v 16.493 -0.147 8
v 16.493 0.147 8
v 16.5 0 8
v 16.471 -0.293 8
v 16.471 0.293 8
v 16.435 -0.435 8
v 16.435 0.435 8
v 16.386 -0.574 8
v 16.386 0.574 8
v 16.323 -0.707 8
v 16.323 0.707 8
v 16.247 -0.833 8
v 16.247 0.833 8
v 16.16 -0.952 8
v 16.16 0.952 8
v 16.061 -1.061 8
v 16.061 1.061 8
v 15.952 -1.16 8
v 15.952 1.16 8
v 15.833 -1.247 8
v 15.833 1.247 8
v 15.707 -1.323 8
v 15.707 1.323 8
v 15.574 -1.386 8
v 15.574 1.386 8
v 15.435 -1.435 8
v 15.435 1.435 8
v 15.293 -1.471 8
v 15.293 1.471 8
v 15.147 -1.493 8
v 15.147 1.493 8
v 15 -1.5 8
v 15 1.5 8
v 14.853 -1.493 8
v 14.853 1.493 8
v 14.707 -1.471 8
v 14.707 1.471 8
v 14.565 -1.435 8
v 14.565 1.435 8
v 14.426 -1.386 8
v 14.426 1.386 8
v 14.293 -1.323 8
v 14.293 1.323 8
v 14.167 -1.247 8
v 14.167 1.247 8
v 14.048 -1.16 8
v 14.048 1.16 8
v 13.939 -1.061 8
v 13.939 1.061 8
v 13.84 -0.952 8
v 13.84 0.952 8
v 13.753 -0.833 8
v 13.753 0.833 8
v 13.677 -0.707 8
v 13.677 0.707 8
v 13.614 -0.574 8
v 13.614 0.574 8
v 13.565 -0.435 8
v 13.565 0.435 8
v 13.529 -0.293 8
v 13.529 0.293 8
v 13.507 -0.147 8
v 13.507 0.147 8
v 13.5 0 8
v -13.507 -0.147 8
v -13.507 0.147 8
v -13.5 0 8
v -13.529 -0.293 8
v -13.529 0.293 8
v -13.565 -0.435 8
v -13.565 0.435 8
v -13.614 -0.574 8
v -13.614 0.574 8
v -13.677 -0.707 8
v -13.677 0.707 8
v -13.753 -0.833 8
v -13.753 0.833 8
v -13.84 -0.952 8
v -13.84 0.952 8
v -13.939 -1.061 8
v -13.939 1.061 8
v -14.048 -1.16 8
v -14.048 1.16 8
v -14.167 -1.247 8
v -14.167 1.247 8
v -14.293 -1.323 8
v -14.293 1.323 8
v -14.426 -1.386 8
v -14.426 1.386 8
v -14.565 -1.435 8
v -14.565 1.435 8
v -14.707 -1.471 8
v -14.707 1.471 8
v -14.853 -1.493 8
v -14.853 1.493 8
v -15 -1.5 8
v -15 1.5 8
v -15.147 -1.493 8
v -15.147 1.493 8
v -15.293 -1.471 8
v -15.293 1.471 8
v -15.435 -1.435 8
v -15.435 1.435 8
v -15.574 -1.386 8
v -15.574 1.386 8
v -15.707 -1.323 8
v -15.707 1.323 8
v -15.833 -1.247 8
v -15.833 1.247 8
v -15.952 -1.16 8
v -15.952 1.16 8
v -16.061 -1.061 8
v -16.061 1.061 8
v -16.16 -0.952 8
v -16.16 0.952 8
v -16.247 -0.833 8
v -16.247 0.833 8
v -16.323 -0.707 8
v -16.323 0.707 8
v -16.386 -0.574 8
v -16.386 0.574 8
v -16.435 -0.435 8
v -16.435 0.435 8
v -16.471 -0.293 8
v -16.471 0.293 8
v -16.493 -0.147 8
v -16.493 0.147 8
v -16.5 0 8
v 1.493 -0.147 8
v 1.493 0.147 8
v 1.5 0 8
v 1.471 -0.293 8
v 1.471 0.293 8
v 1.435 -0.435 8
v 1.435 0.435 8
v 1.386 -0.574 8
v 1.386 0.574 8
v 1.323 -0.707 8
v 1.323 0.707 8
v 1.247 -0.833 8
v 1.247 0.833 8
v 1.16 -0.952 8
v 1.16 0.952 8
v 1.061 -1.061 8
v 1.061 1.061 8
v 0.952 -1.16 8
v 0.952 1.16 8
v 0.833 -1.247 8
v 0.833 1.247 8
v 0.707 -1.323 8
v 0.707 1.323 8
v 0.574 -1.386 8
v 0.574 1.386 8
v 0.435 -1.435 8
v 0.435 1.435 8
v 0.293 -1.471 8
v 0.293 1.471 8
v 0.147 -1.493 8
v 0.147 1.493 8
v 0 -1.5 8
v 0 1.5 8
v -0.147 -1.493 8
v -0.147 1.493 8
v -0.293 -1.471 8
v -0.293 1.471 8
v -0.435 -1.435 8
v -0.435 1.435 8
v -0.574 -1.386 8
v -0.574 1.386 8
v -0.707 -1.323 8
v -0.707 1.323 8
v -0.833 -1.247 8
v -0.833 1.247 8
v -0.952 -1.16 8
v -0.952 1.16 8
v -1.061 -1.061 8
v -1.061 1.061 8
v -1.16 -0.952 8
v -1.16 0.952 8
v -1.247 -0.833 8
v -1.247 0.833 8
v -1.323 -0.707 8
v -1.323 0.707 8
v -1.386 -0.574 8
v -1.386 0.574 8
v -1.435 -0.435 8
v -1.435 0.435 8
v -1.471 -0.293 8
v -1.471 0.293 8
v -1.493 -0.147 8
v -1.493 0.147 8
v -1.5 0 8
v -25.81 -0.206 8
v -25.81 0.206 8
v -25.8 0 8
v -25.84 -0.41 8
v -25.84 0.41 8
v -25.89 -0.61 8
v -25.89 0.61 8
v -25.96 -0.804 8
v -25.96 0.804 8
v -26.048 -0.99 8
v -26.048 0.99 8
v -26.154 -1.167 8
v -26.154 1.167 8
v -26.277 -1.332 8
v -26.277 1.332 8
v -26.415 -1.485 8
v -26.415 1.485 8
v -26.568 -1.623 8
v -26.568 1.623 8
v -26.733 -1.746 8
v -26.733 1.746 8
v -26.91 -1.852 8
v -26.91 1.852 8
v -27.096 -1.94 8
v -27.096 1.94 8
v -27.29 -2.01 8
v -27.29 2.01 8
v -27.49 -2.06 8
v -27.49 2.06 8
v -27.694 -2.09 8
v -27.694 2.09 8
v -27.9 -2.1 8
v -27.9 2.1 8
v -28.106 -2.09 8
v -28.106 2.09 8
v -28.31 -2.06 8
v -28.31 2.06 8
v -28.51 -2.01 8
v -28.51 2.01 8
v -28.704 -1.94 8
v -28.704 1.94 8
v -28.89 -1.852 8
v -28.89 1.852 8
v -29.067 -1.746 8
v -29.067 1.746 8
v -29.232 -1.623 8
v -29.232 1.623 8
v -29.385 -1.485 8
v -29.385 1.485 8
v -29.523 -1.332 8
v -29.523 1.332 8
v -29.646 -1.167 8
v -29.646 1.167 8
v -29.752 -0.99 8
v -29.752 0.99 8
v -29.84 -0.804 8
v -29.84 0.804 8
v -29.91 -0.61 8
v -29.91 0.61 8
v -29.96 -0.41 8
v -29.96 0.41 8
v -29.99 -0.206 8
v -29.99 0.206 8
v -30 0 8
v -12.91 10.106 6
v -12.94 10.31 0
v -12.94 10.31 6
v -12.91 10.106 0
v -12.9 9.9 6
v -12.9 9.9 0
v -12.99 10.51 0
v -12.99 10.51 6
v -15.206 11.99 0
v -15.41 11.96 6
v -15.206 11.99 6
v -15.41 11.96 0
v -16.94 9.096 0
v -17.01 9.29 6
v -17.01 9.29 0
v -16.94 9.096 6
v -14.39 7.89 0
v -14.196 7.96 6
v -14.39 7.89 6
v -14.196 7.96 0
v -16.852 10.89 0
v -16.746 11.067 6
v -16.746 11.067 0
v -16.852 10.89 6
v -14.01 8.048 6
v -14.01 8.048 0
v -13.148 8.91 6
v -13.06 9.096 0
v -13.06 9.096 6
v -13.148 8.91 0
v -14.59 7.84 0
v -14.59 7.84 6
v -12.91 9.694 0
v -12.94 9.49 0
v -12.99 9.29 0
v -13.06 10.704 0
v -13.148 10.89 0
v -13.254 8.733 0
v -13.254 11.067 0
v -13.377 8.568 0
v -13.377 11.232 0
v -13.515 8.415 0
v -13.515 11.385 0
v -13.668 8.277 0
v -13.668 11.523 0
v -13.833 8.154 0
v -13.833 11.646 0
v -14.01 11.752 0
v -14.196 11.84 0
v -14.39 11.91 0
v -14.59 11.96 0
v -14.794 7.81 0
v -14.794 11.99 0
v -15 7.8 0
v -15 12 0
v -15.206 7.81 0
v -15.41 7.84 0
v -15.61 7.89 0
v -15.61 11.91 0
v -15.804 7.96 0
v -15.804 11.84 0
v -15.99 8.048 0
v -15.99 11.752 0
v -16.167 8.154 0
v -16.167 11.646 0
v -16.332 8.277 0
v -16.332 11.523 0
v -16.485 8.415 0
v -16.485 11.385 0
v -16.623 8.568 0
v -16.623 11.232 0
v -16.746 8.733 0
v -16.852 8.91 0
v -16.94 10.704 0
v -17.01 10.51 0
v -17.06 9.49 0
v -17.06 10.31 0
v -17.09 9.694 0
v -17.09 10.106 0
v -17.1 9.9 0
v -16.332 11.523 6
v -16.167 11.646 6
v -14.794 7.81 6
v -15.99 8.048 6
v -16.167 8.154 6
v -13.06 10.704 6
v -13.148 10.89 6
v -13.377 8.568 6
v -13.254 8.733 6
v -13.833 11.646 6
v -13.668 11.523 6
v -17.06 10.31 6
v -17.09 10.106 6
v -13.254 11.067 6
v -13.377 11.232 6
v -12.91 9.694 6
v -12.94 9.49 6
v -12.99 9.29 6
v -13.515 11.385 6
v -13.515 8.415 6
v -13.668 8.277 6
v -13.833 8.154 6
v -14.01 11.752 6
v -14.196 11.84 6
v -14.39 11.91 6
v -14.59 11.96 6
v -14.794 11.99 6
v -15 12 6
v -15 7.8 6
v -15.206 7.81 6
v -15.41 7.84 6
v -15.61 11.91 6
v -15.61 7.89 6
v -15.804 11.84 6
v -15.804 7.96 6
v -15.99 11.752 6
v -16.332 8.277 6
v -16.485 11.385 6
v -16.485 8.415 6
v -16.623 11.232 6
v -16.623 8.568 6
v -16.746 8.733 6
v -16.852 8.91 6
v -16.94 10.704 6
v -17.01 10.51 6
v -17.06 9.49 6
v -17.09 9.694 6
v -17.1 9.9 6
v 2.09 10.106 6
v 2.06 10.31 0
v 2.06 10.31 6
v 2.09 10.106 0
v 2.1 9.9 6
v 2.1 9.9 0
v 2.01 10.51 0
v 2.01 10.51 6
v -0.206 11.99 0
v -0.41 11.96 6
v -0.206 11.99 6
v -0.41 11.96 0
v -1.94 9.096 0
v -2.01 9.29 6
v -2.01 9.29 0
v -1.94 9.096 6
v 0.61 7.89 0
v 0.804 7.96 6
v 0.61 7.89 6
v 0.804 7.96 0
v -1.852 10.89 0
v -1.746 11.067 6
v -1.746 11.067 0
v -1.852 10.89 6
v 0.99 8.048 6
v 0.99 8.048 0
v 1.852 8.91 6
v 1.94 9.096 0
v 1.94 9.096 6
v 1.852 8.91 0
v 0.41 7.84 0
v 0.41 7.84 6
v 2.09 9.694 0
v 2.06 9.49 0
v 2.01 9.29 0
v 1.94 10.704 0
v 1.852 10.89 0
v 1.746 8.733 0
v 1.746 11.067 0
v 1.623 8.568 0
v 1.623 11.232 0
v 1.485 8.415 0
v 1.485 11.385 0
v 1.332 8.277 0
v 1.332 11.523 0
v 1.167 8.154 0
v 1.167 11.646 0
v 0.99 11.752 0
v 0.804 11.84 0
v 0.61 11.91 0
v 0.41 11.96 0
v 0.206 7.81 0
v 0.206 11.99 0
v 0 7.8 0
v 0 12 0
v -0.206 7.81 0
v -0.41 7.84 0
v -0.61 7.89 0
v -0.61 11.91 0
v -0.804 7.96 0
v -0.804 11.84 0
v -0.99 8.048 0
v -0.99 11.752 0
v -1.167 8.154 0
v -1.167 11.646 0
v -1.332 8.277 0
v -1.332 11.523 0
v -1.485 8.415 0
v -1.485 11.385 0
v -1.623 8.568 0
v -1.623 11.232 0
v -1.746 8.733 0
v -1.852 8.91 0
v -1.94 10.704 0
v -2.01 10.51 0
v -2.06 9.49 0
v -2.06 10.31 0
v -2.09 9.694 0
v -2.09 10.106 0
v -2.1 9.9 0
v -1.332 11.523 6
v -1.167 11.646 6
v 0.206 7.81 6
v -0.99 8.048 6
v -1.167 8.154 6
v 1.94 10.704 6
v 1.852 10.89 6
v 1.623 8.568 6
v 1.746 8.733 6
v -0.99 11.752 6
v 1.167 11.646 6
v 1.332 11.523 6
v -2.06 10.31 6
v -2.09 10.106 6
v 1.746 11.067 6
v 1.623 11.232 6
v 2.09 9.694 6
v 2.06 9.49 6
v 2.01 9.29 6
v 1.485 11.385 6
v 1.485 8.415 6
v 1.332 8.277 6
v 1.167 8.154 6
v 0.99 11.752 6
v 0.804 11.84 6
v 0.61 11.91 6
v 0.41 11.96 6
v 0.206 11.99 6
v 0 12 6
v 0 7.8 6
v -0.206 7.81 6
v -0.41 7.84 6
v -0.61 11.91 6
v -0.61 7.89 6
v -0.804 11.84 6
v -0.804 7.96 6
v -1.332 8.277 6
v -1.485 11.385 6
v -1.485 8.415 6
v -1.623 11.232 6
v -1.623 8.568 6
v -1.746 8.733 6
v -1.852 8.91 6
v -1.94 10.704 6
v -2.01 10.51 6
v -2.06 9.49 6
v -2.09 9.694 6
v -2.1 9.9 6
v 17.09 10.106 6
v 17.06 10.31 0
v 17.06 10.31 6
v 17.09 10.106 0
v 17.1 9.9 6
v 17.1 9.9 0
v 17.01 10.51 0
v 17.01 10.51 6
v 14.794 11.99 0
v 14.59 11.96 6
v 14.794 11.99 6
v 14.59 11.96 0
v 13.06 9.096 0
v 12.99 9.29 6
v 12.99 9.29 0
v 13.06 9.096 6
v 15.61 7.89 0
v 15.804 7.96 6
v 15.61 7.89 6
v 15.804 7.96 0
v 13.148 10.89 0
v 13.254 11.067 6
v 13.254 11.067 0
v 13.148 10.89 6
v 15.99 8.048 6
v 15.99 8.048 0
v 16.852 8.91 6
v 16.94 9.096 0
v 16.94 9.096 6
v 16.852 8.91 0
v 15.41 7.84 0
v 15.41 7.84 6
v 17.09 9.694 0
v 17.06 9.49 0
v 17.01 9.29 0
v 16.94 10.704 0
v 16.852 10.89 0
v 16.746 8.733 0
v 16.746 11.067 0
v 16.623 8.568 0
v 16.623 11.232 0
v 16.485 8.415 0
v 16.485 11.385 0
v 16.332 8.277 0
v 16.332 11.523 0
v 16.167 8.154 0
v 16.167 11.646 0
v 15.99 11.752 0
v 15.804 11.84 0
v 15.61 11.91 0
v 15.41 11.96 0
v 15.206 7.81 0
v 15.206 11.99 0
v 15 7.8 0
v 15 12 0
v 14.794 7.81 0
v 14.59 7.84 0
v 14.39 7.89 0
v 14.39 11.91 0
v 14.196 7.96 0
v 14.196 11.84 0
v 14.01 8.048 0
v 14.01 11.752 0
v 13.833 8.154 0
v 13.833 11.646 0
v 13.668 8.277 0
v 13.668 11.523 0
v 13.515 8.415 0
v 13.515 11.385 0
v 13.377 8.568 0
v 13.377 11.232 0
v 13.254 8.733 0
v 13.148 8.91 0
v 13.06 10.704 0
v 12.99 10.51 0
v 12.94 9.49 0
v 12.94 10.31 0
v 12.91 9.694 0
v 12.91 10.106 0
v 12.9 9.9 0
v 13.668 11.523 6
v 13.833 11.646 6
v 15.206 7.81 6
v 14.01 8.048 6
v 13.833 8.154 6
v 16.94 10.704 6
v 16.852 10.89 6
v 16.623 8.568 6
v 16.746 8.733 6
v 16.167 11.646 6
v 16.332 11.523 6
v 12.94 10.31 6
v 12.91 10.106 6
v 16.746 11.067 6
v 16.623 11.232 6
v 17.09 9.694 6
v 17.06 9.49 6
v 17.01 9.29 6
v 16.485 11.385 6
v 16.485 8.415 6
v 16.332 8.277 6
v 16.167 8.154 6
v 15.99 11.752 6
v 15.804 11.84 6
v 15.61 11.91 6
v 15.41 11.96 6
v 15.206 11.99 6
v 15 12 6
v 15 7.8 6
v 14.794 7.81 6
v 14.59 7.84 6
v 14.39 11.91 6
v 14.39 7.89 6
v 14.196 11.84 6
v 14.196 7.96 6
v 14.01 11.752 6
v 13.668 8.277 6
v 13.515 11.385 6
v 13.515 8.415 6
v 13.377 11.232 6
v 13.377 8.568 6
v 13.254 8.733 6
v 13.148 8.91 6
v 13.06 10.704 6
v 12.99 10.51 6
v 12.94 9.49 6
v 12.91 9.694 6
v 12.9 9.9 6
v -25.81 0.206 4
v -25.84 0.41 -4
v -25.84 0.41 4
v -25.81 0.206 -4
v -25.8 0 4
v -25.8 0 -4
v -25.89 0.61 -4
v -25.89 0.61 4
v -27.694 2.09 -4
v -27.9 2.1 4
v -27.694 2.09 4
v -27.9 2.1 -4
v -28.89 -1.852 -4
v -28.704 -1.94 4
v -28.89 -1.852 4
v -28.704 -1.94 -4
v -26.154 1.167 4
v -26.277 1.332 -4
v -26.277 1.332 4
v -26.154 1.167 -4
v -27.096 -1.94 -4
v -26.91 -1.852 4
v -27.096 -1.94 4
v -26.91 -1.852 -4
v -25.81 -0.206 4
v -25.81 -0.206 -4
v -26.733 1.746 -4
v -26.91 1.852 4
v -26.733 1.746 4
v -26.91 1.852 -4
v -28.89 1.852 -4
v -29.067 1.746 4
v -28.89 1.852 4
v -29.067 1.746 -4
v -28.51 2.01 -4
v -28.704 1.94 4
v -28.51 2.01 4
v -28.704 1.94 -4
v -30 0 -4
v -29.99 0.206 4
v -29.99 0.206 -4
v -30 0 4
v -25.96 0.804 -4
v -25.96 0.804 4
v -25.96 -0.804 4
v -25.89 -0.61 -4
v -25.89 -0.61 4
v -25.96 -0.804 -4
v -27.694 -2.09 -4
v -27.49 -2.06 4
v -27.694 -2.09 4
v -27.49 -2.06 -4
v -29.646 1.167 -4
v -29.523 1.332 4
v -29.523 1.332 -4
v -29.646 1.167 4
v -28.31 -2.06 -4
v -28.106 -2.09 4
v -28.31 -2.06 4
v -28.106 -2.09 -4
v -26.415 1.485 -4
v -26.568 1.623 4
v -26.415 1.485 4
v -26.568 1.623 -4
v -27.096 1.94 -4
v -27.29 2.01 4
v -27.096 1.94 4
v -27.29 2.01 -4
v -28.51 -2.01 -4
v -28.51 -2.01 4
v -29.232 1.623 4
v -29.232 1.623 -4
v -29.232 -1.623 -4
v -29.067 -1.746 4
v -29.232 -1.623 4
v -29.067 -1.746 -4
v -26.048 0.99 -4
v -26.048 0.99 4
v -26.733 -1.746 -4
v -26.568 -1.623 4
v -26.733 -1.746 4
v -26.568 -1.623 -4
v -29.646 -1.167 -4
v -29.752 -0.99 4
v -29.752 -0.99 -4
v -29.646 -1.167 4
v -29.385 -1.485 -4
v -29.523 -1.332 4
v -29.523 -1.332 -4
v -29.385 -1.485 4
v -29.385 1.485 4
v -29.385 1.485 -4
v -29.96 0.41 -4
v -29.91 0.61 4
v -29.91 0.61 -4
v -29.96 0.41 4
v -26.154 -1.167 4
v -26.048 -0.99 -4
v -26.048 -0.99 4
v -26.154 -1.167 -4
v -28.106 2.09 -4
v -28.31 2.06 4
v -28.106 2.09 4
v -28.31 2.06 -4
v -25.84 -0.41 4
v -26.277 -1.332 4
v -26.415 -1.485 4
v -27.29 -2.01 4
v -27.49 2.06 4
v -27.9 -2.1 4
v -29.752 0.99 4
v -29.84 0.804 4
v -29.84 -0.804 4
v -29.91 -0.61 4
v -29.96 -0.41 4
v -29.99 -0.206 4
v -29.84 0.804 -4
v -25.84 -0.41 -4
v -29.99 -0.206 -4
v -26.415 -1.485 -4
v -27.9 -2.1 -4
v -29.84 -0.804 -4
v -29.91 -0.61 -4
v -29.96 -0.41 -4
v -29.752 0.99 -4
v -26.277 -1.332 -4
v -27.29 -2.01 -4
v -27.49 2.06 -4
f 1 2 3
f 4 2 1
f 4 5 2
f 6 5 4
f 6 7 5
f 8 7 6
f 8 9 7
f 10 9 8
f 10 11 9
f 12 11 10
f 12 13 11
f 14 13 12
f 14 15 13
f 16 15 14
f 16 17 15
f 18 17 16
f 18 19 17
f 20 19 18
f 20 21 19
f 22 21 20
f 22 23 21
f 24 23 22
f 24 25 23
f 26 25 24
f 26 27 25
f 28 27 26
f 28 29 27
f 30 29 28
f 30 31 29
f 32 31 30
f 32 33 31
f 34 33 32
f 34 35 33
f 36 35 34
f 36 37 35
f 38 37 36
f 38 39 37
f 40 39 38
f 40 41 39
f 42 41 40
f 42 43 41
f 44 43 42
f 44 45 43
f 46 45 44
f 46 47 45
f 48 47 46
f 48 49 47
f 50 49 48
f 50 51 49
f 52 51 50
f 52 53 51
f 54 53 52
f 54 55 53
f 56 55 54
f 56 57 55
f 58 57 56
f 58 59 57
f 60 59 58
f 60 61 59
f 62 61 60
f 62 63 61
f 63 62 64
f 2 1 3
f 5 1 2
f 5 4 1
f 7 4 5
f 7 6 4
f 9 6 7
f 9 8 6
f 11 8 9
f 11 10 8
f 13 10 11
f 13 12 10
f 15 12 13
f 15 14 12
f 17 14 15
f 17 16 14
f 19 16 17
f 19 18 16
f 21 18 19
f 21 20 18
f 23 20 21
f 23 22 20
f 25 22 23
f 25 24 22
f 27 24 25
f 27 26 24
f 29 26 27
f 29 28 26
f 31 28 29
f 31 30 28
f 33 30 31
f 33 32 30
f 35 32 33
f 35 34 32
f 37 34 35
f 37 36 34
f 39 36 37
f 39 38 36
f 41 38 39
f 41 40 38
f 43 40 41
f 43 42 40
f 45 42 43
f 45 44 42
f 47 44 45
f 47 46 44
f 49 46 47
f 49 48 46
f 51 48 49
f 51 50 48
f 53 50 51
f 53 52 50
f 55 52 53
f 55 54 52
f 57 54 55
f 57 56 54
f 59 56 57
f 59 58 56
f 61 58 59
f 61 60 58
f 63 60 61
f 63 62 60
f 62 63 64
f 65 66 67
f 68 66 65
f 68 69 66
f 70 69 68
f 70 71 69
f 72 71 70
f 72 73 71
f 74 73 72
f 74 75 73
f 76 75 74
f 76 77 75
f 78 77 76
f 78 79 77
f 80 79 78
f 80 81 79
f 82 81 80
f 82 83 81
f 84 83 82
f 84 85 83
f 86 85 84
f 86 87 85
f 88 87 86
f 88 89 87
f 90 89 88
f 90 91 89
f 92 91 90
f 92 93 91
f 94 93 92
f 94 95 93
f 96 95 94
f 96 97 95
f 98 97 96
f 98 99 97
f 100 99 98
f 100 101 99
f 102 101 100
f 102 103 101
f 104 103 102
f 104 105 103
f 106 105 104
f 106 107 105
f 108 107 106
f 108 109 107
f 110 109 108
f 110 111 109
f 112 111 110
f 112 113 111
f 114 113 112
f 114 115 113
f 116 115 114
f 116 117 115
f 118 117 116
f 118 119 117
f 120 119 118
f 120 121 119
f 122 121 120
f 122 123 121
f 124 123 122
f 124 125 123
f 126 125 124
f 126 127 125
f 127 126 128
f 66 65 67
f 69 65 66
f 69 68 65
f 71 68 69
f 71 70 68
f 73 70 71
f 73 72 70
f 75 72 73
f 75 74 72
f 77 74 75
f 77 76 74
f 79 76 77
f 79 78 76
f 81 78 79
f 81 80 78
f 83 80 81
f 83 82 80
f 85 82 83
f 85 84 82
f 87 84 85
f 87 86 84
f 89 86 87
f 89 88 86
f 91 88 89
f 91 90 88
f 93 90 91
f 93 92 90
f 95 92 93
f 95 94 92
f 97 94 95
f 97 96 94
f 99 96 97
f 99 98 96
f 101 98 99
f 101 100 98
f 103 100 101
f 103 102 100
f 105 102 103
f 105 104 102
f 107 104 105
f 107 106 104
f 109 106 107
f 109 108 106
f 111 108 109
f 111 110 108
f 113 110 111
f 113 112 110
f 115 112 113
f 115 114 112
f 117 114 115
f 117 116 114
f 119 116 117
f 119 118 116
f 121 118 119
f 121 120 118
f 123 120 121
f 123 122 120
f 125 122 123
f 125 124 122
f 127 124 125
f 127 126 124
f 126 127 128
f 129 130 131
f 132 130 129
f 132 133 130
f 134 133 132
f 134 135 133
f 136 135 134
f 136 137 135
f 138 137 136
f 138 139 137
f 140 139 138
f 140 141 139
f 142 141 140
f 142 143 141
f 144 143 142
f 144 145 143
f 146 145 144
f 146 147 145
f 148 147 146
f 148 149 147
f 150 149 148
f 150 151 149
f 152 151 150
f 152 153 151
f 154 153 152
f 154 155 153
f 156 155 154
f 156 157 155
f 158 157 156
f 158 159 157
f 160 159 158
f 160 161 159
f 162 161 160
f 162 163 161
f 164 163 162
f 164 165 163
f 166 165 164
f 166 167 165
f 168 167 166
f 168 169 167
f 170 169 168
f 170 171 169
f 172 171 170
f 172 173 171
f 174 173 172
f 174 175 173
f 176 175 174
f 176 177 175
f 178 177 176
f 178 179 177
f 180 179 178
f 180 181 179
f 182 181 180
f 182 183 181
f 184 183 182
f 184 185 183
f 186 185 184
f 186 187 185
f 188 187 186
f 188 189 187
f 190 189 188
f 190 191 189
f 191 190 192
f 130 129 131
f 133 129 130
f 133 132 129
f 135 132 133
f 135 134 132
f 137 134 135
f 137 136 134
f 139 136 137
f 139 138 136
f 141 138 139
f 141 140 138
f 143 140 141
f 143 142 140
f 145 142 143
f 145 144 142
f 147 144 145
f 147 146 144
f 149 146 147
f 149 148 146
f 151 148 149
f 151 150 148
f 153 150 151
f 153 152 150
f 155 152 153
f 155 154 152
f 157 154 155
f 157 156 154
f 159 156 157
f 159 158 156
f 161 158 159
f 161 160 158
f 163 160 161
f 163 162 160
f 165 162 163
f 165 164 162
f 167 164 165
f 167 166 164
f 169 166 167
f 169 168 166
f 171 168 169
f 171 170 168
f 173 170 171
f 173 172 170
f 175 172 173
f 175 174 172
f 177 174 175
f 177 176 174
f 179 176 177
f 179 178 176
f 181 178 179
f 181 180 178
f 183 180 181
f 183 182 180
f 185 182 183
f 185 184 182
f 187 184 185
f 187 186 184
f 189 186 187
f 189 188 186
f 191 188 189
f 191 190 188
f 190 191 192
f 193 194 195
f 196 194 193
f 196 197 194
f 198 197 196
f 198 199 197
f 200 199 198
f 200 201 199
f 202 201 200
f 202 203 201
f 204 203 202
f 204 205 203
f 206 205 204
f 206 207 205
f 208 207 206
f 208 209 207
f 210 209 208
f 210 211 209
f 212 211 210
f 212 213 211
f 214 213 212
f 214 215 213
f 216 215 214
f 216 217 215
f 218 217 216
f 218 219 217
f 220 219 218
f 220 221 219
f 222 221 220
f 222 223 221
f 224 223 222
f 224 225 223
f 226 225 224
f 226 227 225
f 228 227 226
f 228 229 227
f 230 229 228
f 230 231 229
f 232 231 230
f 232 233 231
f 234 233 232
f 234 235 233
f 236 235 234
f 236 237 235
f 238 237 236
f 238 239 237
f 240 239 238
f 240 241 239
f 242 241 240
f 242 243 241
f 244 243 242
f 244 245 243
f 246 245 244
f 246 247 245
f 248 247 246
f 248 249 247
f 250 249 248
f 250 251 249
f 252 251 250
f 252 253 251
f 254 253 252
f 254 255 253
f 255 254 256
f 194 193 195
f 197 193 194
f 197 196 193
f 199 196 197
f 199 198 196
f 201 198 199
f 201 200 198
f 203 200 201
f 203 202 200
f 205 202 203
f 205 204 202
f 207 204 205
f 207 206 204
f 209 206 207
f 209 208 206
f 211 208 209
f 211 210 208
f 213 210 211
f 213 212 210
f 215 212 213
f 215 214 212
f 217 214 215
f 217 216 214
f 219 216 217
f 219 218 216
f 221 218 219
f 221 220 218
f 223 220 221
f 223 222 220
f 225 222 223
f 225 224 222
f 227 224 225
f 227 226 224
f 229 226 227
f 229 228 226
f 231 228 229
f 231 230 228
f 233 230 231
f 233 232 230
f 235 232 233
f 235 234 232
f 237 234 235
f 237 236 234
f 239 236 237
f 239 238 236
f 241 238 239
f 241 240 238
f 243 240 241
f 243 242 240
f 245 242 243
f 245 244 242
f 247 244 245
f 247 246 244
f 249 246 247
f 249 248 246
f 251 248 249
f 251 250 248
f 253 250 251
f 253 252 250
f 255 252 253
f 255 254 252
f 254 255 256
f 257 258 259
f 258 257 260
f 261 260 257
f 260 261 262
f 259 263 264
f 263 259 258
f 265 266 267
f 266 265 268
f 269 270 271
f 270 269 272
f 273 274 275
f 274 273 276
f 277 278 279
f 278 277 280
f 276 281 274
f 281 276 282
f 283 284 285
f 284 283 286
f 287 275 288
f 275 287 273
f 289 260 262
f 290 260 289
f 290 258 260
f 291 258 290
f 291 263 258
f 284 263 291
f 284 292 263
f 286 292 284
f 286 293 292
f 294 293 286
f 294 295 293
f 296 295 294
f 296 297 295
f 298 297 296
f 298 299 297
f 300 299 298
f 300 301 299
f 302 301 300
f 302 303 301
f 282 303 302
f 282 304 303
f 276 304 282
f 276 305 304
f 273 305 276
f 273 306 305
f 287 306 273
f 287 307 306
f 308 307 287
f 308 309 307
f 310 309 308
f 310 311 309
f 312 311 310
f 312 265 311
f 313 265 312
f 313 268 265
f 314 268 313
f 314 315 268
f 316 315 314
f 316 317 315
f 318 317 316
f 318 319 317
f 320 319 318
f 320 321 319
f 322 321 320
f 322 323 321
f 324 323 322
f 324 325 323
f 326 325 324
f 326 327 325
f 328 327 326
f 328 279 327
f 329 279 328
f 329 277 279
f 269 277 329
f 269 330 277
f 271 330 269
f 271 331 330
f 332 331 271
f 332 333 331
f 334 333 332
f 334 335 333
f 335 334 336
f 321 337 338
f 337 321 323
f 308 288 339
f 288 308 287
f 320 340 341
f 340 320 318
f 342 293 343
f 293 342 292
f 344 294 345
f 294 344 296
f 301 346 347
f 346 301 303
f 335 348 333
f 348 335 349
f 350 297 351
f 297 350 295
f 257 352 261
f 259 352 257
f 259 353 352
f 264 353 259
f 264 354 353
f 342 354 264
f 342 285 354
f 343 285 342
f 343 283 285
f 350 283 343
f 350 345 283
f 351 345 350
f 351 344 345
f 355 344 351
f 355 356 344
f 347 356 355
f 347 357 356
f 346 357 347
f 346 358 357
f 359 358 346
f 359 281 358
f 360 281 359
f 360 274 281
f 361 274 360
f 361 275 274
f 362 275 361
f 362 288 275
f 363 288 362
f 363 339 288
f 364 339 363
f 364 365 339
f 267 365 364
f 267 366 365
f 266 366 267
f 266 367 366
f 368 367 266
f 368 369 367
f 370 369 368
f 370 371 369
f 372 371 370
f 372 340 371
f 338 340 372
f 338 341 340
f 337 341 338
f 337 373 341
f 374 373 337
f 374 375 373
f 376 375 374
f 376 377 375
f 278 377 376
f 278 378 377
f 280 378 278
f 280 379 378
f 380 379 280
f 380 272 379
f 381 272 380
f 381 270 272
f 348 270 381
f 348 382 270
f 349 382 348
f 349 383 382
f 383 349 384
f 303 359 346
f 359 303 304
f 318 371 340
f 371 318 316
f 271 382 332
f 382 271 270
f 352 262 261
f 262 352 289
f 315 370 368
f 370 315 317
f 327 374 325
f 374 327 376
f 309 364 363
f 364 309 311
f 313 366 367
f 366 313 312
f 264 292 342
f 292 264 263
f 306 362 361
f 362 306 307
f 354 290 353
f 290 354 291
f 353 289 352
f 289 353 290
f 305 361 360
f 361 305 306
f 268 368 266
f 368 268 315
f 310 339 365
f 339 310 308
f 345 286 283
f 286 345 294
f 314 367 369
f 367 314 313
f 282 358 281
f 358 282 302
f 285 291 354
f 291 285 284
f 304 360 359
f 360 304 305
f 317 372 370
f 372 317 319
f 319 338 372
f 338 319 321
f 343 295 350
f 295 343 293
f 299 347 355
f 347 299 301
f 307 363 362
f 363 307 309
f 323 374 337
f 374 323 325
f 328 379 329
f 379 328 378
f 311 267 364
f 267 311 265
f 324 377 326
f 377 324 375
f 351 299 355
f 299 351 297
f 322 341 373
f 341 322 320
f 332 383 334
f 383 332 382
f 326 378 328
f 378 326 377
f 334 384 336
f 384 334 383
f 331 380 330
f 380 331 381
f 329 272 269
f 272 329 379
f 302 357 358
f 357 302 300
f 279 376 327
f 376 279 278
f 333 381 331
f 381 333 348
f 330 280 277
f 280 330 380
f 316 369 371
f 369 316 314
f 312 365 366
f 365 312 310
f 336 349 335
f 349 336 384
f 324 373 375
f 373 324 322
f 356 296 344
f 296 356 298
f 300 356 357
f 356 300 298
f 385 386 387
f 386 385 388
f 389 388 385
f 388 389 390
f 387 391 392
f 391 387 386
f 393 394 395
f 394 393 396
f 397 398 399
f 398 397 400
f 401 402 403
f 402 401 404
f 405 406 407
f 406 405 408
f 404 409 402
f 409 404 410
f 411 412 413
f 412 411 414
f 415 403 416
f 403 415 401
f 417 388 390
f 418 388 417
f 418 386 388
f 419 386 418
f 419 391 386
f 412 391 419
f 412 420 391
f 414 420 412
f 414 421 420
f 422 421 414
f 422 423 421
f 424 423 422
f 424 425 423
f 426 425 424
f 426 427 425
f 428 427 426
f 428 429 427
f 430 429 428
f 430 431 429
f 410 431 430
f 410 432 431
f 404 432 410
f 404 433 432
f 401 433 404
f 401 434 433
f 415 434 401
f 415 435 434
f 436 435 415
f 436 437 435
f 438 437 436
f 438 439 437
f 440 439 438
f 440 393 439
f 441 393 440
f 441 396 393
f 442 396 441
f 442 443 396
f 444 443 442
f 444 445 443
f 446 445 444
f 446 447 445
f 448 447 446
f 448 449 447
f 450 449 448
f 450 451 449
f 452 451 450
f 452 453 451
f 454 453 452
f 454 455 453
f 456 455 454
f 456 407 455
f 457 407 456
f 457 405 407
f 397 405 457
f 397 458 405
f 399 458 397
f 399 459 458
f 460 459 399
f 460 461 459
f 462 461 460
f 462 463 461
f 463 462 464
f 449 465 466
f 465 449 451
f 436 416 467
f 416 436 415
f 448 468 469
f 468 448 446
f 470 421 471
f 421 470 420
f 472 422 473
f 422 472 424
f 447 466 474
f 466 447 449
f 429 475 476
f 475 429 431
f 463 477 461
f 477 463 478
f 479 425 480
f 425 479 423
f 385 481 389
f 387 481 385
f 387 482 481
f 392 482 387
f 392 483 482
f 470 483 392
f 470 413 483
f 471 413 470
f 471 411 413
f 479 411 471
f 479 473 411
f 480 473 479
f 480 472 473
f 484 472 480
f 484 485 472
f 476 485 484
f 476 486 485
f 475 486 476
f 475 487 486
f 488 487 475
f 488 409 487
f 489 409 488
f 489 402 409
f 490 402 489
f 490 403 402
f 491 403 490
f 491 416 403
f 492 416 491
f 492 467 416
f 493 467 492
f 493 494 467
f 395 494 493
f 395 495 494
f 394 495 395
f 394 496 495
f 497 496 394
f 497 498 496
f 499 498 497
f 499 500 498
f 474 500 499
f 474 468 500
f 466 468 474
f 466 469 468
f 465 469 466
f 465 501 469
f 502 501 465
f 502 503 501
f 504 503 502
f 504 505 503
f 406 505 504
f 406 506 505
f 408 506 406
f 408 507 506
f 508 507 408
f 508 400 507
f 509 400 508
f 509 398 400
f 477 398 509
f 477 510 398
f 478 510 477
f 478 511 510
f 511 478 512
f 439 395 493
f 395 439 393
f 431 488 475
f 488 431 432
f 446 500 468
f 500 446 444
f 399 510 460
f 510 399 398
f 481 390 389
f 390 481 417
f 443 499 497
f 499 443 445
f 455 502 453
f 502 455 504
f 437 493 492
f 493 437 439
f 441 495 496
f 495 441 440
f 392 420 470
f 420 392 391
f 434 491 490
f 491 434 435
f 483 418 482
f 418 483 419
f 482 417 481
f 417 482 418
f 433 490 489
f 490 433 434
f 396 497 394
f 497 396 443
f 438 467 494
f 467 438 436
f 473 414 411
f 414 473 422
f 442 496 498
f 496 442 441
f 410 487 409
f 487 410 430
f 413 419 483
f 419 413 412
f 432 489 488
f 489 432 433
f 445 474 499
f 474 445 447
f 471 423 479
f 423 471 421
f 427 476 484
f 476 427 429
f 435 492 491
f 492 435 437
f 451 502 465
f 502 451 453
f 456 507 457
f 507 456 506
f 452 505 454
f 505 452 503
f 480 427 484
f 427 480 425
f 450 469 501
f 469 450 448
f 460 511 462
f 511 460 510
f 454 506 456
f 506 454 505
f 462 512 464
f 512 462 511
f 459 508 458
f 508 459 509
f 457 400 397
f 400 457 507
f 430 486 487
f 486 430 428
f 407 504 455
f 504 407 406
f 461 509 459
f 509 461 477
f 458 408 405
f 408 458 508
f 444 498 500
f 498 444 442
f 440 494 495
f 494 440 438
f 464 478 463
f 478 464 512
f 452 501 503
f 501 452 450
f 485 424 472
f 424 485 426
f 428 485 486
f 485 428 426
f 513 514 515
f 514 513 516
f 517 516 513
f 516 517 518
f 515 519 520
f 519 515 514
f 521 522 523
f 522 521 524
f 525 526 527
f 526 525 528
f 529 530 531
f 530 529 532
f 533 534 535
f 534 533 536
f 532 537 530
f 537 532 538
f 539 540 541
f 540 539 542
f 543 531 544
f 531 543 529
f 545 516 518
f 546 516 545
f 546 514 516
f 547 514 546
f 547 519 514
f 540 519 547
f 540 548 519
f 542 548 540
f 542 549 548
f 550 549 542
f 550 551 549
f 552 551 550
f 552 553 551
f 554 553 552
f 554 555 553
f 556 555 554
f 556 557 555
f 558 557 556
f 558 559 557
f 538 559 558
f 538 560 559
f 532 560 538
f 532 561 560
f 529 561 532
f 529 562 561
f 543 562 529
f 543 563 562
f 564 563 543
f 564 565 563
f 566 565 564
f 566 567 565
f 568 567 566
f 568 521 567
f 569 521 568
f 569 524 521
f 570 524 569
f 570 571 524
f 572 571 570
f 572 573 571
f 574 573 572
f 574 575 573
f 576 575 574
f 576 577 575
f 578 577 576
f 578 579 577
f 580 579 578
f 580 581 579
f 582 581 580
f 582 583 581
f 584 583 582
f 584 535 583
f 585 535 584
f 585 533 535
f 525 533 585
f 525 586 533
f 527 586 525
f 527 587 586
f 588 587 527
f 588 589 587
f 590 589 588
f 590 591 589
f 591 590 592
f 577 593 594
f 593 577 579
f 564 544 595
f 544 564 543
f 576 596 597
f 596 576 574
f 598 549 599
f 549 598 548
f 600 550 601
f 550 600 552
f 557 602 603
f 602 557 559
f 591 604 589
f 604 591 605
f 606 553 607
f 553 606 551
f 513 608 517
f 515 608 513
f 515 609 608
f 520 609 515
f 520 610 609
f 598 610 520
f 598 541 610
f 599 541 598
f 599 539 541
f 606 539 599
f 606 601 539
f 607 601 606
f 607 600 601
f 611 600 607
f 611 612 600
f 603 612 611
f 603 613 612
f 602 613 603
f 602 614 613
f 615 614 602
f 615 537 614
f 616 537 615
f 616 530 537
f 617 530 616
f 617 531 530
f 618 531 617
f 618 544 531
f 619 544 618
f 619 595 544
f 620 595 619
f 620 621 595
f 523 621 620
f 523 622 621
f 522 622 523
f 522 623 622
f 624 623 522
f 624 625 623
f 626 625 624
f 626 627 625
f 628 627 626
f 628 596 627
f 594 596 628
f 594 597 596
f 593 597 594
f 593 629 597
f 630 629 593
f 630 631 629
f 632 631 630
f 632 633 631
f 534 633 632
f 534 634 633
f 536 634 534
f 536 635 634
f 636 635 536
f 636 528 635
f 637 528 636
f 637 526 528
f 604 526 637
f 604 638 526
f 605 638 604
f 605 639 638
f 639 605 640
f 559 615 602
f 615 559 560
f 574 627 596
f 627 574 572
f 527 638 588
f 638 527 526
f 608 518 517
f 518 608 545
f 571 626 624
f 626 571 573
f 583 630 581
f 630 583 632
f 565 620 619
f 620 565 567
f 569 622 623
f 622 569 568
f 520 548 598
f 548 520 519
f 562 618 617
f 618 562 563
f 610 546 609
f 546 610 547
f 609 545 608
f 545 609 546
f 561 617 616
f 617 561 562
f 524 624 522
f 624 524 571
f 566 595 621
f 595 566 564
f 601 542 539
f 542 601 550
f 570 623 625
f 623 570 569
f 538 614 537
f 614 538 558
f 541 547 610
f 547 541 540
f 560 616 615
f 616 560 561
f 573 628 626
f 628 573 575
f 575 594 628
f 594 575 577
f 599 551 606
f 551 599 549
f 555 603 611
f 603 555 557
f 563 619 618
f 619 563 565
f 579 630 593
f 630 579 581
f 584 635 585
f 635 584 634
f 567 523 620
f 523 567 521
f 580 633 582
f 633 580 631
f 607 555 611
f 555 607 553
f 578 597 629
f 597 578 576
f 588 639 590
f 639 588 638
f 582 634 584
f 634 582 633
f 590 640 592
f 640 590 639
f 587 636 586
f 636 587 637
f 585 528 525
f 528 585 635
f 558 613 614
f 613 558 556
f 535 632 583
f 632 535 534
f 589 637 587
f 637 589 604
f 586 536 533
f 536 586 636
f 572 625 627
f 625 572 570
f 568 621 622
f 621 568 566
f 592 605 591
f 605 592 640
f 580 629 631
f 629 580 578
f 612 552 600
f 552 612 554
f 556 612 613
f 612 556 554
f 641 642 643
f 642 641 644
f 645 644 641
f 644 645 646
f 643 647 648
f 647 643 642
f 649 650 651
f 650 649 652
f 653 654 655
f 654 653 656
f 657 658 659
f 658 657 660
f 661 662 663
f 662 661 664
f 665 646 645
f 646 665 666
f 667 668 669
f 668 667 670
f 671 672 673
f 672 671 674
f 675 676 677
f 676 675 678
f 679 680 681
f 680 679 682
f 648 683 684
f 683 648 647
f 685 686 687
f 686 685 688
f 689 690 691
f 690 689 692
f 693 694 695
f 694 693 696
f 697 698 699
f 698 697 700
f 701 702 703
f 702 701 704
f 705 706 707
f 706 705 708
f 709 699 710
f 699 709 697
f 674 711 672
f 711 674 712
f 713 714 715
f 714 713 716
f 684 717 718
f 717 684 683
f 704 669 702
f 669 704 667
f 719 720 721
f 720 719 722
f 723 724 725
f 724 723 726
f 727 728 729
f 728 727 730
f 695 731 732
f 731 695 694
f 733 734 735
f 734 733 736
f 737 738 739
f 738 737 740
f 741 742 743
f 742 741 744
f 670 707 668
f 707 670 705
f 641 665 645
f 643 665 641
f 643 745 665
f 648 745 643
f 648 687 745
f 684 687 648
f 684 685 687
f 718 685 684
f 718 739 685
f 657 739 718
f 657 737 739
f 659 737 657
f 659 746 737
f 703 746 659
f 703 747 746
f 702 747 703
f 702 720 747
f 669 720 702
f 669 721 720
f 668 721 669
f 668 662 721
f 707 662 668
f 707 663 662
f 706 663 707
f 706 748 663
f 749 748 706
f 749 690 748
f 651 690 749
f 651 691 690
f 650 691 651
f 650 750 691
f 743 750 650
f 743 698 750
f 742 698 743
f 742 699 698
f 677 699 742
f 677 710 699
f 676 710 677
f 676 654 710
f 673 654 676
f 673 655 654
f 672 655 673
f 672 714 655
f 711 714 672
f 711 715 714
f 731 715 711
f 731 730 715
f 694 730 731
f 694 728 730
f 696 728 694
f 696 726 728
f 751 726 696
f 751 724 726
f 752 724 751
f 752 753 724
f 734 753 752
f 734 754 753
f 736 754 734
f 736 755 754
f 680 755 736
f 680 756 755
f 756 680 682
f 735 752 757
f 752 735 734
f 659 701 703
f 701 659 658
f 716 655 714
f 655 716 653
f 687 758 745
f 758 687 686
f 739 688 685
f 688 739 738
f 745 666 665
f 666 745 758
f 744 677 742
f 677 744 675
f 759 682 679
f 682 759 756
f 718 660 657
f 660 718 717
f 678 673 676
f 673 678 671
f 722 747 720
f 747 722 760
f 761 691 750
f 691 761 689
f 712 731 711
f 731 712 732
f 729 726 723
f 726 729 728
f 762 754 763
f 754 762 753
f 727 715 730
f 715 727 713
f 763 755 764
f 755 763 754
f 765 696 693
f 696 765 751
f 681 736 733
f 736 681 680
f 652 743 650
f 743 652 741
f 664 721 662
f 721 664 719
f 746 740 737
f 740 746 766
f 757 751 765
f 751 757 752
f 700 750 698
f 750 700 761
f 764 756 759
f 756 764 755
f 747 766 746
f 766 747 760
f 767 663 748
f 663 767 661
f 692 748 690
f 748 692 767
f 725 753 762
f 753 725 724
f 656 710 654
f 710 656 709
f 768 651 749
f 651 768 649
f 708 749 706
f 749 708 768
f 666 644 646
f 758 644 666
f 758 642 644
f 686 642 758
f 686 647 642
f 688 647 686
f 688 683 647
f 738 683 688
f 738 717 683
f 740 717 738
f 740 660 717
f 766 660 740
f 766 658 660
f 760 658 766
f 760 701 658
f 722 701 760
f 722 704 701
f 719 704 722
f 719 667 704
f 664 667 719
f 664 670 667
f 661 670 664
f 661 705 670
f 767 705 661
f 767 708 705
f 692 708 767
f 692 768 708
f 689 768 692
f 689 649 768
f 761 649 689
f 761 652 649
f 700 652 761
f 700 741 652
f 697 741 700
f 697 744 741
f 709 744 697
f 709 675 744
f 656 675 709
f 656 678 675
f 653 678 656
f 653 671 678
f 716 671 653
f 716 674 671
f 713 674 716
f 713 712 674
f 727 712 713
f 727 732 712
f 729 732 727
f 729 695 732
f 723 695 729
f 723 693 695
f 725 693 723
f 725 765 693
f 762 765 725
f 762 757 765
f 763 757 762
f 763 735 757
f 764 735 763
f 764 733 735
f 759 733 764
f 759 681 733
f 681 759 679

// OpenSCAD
// --- Dimensions (mm) ---

// Block dimensions
block_length = 60;   // X dimension
block_width = 24;    // Y dimension
block_height = 16;   // Z dimension

// Tubing/Channel dimensions
tube_diameter = 3.0;  // Diameter of internal channels
inlet_socket_dia = 4.2; // Inlet socket diameter
outlet_socket_dia = 4.2; // Outlet socket diameter
inlet_depth = 8.0;    // Depth of inlet socket
outlet_depth = 6.0;   // Depth of outlet sockets

// Screw hole dimensions
screw_hole_diameter = 3.4; // Diameter for M3 screws
screw_hole_offset_x1 = -25; // X position of first screw hole (relative to center)
screw_hole_offset_x2 = 25;  // X position of second screw hole (relative to center)
screw_hole_y_pos = -6.0;    // Y position of both screw holes

// Channel positions and lengths
main_channel_stop_x = 15; // Where the main channel stops internally
outlet_branch_x1 = -15;  // X position for first outlet branch
outlet_branch_x2 = 0;    // X position for second outlet branch
outlet_branch_x3 = 15;   // X position for third outlet branch

// --- Constants ---
$fn = 64; // High resolution for curves

// --- Base Block ---
module block() {
    cube([block_length, block_width, block_height], center = true);
}

// --- Features ---

// 1. Inlet Socket (on -X face, y=0)
module inlet_socket() {
    // Positioned at the -X end face (-block_length/2). Y=0 is correct. Z centered.
    translate([-block_length/2 + (inlet_socket_dia / 2), 0, 0]) {
        cylinder(h = inlet_depth, r = inlet_socket_dia / 2, center = true);
    }
}

// 2. Outlet Sockets (on +Y face)
module outlet_socket() {
    // Socket centered at the branch X position, on the Y face (+block_width/2). Z centered.
    translate([0, block_width/2 - (outlet_socket_dia / 2), 0]) {
        cylinder(h = outlet_depth, r = outlet_socket_dia / 2, center = true);
    }
}

// 3. Internal Channels (Hollowed out)
module internal_channels() {
    difference() {
        block(); // Start with the solid block shape for subtraction reference

        // A. Main Channel (Runs from inlet area towards X=15, closed inside)
        translate([-(block_length/2 - (inlet_socket_dia / 2)), 0, block_height/2]) {
            cylinder(h = main_channel_stop_x + (block_length/2 - (inlet_socket_dia / 2)) , r = tube_diameter / 2);
        }

        // B. Outlet Channels (Branching from X=-15, 0, 15 towards +Y face)
        for (i = [outlet_branch_x1, outlet_branch_x2, outlet_branch_x3]) {
            translate([i, 0, block_height/2]) {
                // Length needed: from center line (Y=0) to exit face (Y=block_width/2). Add tube radius for clean cut.
                cylinder(h = block_width / 2 + tube_diameter/2 , r = tube_diameter / 2);
            }
        }

        // C. Closing the Main Channel at X=15 (to ensure it's closed inside)
        translate([main_channel_stop_x + block_length/2, 0, block_height/2]) {
            cylinder(h = tube_diameter * 2, r = tube_diameter / 2);
        }

        // D. Inlet Connection Cutout (To allow tubing entry)
        translate([-block_length/2 + (inlet_socket_dia / 2), 0, block_height/2]) {
            cylinder(h = block_height * 2, r = inlet_socket_dia / 2);
        }

    }
}


// 4. Screw Holes (Vertical through-holes)
module screw_holes() {
    for (i = [screw_hole_offset_x1, screw_hole_offset_x2]) {
        translate([i, screw_hole_y_pos, -block_height/2 - 0.01]) { // Extend slightly past bottom face
            cylinder(h = block_height + 0.02, r = screw_hole_diameter / 2);
        }
    }
}


// --- Final Assembly ---

// The structure must be: (Block - Internal Cuts) U External Sockets
difference() {
    // 1. Base Block minus internal features
    block();
    union() {
        internal_channels();
        screw_holes();
    }
}
union() {
    // 2. Add external sockets back onto the resulting shape
    inlet_socket();

    // Outlet sockets (must be translated correctly to align with block center)
    for (i = [outlet_branch_x1, outlet_branch_x2, outlet_branch_x3]) {
        translate([0, 0, 0]) { // Base translation for the union operation
            // Positioned at X=i, Y=+block_width/2, Z centered (since cylinder is centered)
            translate([i, block_width/2 - (outlet_socket_dia / 2), 0]) {
                cylinder(h = outlet_depth, r = outlet_socket_dia / 2);
            }
        }
    }
}
